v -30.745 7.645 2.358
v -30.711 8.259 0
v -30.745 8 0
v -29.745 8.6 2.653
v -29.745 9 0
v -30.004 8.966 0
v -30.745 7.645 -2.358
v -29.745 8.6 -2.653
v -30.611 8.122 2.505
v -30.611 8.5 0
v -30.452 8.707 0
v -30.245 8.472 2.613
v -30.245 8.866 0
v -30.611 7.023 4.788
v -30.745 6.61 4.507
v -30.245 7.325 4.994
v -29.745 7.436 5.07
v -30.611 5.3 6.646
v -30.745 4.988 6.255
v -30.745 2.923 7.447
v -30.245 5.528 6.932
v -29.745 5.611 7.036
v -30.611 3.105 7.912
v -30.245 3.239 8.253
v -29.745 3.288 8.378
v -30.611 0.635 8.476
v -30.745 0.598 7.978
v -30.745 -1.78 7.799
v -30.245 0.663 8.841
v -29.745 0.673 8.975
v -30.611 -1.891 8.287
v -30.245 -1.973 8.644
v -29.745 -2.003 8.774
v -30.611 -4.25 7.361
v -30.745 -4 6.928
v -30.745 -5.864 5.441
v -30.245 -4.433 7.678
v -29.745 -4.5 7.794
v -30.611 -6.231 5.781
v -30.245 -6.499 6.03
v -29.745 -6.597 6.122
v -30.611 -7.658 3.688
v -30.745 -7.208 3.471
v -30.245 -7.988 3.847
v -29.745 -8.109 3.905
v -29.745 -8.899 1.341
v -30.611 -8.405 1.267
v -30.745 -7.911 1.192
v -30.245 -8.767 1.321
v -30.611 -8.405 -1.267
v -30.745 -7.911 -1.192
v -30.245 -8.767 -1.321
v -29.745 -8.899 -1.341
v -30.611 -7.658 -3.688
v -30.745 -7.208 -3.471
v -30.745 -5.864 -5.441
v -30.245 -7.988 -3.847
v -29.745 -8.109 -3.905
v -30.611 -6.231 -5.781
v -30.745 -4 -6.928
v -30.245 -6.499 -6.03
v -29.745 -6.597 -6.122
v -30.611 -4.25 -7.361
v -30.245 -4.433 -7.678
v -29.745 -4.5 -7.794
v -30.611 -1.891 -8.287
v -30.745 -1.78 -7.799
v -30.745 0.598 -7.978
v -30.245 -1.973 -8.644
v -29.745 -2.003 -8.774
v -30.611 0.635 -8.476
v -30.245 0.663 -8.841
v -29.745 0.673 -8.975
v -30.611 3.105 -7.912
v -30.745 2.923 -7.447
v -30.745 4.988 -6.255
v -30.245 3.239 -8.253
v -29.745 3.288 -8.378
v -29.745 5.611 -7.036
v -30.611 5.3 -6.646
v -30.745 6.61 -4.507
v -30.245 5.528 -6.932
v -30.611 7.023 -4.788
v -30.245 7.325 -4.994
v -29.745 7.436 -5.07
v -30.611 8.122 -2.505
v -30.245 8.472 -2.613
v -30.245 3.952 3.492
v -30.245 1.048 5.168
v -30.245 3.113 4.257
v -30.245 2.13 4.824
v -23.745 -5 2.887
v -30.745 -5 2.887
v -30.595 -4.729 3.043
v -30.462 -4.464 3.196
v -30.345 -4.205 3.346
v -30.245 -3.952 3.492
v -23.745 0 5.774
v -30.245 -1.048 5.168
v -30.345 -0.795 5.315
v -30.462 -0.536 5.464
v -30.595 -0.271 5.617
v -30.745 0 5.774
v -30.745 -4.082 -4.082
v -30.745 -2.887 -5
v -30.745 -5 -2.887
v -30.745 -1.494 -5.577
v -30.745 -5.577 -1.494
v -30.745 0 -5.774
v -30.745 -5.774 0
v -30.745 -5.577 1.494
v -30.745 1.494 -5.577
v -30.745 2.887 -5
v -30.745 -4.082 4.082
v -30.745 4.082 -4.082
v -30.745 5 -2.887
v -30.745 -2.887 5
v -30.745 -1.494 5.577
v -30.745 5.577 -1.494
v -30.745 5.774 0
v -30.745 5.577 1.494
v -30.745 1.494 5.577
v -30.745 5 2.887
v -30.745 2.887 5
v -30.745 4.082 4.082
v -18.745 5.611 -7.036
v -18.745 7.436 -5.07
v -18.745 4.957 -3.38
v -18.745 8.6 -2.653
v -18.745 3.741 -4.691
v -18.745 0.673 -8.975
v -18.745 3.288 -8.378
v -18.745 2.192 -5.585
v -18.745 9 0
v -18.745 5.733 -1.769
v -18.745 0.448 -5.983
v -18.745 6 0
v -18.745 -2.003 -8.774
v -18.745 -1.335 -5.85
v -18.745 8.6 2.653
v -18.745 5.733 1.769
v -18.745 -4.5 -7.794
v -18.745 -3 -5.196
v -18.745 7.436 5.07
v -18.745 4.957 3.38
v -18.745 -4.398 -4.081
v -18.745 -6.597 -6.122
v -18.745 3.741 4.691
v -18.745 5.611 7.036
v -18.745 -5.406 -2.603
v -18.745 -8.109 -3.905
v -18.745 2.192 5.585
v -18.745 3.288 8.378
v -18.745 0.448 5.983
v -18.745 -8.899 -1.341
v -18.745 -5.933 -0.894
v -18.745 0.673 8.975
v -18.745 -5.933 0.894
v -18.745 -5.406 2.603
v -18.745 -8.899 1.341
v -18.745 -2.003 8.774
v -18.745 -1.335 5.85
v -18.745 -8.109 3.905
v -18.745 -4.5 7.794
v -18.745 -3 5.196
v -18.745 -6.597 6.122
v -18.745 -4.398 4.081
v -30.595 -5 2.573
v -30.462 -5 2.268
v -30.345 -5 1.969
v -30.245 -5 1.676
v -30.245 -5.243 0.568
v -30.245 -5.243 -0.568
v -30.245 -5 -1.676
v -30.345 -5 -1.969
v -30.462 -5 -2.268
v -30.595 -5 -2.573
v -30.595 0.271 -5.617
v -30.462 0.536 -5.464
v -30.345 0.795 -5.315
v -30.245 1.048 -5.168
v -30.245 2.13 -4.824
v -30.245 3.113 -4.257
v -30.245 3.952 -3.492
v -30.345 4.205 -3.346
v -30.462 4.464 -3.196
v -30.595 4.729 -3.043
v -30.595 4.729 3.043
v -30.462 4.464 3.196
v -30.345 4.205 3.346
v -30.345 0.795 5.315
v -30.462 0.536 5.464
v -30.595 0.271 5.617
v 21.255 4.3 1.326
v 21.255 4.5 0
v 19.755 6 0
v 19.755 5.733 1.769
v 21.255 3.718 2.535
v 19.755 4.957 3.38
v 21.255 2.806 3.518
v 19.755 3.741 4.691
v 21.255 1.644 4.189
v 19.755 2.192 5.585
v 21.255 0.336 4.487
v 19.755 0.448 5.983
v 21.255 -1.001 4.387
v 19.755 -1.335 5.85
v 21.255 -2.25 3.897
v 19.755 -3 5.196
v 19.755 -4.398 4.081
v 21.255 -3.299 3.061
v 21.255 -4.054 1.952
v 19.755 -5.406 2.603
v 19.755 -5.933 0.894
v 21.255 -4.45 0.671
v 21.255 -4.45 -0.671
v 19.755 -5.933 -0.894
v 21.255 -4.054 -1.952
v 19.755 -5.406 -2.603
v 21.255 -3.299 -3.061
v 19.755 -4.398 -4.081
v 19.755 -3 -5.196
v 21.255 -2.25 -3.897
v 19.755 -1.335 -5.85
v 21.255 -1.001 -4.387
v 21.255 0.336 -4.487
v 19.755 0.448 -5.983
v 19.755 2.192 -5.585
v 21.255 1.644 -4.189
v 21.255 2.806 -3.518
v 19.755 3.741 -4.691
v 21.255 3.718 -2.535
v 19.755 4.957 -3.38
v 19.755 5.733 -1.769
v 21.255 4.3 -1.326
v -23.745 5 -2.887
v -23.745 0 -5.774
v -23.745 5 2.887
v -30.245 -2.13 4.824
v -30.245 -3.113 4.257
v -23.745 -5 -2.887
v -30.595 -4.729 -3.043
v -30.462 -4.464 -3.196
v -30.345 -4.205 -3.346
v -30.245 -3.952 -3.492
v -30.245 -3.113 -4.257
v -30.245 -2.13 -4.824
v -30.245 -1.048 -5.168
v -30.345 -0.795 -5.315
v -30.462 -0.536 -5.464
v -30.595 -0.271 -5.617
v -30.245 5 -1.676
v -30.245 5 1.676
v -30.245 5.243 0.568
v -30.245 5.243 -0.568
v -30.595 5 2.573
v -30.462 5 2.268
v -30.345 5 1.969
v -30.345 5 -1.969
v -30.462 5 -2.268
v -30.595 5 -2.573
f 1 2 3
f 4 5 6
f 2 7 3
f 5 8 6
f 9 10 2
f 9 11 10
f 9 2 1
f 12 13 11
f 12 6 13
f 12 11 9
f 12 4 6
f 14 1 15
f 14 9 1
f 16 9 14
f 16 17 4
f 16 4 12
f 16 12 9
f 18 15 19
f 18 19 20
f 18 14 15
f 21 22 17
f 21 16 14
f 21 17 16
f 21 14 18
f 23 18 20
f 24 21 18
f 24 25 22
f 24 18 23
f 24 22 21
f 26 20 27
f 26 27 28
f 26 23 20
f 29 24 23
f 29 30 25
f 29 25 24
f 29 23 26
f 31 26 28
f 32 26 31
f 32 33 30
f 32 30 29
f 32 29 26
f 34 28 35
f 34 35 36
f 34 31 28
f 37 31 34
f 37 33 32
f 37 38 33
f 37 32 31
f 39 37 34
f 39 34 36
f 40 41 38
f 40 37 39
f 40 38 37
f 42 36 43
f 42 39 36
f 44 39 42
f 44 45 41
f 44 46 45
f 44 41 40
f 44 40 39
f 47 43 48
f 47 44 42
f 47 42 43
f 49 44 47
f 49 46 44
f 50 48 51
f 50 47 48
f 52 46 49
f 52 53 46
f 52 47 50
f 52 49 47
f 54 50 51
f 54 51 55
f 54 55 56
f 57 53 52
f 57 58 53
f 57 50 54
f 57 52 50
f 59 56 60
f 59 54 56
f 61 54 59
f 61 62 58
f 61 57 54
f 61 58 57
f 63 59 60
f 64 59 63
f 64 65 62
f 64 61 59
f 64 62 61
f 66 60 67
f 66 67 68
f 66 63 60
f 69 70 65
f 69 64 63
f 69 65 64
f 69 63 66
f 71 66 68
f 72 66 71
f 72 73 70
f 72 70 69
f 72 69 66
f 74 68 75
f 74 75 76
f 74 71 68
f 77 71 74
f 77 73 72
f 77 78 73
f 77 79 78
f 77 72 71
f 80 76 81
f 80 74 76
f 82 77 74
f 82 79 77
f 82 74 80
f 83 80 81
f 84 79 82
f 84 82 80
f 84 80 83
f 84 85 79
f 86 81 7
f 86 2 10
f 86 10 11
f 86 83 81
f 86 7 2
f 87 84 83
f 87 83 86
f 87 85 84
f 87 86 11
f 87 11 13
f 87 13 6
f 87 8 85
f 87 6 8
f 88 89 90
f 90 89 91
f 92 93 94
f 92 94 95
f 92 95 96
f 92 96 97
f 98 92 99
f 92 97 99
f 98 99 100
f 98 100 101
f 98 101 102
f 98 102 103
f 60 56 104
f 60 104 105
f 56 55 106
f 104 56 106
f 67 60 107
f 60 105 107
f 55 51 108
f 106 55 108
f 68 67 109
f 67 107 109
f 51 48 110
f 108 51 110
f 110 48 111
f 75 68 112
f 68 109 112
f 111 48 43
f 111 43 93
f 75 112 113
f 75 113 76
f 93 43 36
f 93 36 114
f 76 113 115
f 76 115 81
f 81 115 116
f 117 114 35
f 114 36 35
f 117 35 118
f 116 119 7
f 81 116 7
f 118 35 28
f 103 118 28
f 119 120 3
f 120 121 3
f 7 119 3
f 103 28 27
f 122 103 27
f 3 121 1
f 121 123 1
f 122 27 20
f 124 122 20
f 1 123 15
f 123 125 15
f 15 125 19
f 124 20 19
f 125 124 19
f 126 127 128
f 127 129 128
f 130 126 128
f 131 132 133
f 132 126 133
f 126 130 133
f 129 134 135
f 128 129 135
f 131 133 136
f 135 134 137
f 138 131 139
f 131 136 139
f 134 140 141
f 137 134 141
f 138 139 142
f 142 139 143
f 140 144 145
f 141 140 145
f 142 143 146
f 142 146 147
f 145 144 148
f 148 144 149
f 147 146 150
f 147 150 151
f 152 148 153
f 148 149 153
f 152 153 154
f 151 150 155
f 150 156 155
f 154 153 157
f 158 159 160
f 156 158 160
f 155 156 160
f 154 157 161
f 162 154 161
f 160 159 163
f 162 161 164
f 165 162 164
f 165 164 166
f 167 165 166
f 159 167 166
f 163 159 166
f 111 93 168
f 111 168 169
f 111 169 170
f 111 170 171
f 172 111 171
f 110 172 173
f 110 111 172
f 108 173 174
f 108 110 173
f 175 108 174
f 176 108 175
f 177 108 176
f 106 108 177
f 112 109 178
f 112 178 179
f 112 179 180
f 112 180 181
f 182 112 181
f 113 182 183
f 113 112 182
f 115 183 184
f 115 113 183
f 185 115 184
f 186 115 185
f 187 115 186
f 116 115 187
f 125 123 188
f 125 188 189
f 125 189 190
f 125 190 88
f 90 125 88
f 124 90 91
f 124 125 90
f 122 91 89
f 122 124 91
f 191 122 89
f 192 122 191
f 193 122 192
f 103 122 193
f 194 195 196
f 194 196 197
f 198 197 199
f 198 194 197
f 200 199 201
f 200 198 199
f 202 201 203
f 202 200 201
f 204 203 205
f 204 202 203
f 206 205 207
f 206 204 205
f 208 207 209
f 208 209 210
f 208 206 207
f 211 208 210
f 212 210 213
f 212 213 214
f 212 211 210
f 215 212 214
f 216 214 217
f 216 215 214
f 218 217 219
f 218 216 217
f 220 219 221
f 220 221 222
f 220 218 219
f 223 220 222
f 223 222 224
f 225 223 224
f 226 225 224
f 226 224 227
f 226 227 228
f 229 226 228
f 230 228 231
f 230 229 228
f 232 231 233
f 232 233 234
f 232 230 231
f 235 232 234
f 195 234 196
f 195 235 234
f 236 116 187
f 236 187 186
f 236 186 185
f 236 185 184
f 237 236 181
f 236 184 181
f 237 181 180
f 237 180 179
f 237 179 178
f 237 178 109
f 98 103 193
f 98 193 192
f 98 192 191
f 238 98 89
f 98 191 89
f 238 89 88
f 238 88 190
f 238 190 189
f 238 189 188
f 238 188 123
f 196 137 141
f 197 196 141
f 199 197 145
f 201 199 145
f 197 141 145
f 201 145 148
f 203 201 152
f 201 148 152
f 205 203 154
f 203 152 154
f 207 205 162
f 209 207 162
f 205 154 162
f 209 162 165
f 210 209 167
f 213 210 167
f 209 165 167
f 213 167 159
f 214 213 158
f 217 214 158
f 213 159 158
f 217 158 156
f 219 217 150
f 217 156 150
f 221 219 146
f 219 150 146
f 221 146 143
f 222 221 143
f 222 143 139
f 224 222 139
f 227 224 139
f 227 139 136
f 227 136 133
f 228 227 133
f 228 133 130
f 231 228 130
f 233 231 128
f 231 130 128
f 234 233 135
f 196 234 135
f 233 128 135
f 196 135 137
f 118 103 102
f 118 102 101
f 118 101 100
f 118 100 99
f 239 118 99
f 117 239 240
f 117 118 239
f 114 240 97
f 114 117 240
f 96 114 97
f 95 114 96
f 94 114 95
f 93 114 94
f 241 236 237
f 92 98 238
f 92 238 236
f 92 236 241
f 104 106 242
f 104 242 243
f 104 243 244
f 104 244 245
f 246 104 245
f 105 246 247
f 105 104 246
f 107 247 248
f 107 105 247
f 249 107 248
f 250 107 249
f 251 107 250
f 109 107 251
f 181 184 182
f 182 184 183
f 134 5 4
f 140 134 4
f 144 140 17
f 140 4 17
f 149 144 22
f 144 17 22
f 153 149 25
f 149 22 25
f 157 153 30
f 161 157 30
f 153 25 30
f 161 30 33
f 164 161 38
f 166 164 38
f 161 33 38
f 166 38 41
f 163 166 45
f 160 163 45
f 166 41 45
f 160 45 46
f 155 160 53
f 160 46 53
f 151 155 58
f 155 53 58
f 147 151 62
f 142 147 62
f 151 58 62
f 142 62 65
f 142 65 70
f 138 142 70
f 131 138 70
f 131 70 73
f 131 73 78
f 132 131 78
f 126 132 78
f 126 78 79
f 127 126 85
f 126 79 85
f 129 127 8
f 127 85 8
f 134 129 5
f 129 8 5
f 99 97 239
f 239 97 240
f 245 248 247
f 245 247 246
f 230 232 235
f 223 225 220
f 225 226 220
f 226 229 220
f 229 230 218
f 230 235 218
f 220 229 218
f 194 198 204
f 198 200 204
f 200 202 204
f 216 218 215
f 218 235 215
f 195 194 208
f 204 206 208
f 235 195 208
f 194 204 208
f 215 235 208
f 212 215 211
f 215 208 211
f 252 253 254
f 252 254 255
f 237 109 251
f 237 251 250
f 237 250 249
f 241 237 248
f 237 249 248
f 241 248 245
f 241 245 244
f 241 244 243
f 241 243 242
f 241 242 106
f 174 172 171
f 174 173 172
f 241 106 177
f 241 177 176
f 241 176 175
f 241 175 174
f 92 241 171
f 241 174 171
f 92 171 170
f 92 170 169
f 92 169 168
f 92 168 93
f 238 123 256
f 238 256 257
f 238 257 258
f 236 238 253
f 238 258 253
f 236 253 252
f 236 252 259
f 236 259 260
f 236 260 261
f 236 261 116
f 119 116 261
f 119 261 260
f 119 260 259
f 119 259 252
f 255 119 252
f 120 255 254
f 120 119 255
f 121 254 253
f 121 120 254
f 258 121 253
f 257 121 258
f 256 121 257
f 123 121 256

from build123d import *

# Parameters (mm, degrees)
F2_R     = 1
F3_SIZE  = 1.5
F5_DEPTH = 7


with BuildPart() as f1:
    # F0 (on Top) → F1 (revolve)
    with BuildSketch(Plane.XY):
        Polygon((-30.745121, 9), (-30.745121, 0), (21.254879, 0), (21.254879, 6), (-18.745121, 6), (-18.745121, 9), align=None)
    revolve(axis=Axis((0.541581, 0, 0), (1, 0, 0)))

    # F2
    f2_edges = [f1.edges().sort_by_distance(p)[0] for p in [
        (-30.745121, -9, 0),
    ]]
    fillet(f2_edges, radius=F2_R)

    # F3
    f3_edges = [f1.edges().sort_by_distance(p)[0] for p in [
        (21.254879, -6, 0),
    ]]
    chamfer(f3_edges, length=F3_SIZE)

    # F4 (on face) → F5 (cut)
    with BuildSketch(Plane(origin=(-30.745121, 0, 0), x_dir=(0, -1, 0), z_dir=(-1, 0, 0))):
        Polygon((5, -2.886751), (5, 0), (5, 2.886751), (0, 5.773503), (-5, 2.886751), (-5, 0), (-5, -2.886751), (0, -5.773503), align=None)
    extrude(amount=-F5_DEPTH, mode=Mode.SUBTRACT)

    # F6 (on Front) → F7 (revolve, cut)
    with BuildSketch(Plane.XZ):
        Polygon((-30.245121, 5.273503), (-30.745121, 5.773503), (-30.745121, 0), (-30.245121, 0), align=None)
    revolve(axis=Axis((0.541581, 0, 0), (1, 0, 0)), mode=Mode.SUBTRACT)


with BuildPart() as f8_1:
    # F8: copy of F1
    add(f1.part)


solid = f1.part
